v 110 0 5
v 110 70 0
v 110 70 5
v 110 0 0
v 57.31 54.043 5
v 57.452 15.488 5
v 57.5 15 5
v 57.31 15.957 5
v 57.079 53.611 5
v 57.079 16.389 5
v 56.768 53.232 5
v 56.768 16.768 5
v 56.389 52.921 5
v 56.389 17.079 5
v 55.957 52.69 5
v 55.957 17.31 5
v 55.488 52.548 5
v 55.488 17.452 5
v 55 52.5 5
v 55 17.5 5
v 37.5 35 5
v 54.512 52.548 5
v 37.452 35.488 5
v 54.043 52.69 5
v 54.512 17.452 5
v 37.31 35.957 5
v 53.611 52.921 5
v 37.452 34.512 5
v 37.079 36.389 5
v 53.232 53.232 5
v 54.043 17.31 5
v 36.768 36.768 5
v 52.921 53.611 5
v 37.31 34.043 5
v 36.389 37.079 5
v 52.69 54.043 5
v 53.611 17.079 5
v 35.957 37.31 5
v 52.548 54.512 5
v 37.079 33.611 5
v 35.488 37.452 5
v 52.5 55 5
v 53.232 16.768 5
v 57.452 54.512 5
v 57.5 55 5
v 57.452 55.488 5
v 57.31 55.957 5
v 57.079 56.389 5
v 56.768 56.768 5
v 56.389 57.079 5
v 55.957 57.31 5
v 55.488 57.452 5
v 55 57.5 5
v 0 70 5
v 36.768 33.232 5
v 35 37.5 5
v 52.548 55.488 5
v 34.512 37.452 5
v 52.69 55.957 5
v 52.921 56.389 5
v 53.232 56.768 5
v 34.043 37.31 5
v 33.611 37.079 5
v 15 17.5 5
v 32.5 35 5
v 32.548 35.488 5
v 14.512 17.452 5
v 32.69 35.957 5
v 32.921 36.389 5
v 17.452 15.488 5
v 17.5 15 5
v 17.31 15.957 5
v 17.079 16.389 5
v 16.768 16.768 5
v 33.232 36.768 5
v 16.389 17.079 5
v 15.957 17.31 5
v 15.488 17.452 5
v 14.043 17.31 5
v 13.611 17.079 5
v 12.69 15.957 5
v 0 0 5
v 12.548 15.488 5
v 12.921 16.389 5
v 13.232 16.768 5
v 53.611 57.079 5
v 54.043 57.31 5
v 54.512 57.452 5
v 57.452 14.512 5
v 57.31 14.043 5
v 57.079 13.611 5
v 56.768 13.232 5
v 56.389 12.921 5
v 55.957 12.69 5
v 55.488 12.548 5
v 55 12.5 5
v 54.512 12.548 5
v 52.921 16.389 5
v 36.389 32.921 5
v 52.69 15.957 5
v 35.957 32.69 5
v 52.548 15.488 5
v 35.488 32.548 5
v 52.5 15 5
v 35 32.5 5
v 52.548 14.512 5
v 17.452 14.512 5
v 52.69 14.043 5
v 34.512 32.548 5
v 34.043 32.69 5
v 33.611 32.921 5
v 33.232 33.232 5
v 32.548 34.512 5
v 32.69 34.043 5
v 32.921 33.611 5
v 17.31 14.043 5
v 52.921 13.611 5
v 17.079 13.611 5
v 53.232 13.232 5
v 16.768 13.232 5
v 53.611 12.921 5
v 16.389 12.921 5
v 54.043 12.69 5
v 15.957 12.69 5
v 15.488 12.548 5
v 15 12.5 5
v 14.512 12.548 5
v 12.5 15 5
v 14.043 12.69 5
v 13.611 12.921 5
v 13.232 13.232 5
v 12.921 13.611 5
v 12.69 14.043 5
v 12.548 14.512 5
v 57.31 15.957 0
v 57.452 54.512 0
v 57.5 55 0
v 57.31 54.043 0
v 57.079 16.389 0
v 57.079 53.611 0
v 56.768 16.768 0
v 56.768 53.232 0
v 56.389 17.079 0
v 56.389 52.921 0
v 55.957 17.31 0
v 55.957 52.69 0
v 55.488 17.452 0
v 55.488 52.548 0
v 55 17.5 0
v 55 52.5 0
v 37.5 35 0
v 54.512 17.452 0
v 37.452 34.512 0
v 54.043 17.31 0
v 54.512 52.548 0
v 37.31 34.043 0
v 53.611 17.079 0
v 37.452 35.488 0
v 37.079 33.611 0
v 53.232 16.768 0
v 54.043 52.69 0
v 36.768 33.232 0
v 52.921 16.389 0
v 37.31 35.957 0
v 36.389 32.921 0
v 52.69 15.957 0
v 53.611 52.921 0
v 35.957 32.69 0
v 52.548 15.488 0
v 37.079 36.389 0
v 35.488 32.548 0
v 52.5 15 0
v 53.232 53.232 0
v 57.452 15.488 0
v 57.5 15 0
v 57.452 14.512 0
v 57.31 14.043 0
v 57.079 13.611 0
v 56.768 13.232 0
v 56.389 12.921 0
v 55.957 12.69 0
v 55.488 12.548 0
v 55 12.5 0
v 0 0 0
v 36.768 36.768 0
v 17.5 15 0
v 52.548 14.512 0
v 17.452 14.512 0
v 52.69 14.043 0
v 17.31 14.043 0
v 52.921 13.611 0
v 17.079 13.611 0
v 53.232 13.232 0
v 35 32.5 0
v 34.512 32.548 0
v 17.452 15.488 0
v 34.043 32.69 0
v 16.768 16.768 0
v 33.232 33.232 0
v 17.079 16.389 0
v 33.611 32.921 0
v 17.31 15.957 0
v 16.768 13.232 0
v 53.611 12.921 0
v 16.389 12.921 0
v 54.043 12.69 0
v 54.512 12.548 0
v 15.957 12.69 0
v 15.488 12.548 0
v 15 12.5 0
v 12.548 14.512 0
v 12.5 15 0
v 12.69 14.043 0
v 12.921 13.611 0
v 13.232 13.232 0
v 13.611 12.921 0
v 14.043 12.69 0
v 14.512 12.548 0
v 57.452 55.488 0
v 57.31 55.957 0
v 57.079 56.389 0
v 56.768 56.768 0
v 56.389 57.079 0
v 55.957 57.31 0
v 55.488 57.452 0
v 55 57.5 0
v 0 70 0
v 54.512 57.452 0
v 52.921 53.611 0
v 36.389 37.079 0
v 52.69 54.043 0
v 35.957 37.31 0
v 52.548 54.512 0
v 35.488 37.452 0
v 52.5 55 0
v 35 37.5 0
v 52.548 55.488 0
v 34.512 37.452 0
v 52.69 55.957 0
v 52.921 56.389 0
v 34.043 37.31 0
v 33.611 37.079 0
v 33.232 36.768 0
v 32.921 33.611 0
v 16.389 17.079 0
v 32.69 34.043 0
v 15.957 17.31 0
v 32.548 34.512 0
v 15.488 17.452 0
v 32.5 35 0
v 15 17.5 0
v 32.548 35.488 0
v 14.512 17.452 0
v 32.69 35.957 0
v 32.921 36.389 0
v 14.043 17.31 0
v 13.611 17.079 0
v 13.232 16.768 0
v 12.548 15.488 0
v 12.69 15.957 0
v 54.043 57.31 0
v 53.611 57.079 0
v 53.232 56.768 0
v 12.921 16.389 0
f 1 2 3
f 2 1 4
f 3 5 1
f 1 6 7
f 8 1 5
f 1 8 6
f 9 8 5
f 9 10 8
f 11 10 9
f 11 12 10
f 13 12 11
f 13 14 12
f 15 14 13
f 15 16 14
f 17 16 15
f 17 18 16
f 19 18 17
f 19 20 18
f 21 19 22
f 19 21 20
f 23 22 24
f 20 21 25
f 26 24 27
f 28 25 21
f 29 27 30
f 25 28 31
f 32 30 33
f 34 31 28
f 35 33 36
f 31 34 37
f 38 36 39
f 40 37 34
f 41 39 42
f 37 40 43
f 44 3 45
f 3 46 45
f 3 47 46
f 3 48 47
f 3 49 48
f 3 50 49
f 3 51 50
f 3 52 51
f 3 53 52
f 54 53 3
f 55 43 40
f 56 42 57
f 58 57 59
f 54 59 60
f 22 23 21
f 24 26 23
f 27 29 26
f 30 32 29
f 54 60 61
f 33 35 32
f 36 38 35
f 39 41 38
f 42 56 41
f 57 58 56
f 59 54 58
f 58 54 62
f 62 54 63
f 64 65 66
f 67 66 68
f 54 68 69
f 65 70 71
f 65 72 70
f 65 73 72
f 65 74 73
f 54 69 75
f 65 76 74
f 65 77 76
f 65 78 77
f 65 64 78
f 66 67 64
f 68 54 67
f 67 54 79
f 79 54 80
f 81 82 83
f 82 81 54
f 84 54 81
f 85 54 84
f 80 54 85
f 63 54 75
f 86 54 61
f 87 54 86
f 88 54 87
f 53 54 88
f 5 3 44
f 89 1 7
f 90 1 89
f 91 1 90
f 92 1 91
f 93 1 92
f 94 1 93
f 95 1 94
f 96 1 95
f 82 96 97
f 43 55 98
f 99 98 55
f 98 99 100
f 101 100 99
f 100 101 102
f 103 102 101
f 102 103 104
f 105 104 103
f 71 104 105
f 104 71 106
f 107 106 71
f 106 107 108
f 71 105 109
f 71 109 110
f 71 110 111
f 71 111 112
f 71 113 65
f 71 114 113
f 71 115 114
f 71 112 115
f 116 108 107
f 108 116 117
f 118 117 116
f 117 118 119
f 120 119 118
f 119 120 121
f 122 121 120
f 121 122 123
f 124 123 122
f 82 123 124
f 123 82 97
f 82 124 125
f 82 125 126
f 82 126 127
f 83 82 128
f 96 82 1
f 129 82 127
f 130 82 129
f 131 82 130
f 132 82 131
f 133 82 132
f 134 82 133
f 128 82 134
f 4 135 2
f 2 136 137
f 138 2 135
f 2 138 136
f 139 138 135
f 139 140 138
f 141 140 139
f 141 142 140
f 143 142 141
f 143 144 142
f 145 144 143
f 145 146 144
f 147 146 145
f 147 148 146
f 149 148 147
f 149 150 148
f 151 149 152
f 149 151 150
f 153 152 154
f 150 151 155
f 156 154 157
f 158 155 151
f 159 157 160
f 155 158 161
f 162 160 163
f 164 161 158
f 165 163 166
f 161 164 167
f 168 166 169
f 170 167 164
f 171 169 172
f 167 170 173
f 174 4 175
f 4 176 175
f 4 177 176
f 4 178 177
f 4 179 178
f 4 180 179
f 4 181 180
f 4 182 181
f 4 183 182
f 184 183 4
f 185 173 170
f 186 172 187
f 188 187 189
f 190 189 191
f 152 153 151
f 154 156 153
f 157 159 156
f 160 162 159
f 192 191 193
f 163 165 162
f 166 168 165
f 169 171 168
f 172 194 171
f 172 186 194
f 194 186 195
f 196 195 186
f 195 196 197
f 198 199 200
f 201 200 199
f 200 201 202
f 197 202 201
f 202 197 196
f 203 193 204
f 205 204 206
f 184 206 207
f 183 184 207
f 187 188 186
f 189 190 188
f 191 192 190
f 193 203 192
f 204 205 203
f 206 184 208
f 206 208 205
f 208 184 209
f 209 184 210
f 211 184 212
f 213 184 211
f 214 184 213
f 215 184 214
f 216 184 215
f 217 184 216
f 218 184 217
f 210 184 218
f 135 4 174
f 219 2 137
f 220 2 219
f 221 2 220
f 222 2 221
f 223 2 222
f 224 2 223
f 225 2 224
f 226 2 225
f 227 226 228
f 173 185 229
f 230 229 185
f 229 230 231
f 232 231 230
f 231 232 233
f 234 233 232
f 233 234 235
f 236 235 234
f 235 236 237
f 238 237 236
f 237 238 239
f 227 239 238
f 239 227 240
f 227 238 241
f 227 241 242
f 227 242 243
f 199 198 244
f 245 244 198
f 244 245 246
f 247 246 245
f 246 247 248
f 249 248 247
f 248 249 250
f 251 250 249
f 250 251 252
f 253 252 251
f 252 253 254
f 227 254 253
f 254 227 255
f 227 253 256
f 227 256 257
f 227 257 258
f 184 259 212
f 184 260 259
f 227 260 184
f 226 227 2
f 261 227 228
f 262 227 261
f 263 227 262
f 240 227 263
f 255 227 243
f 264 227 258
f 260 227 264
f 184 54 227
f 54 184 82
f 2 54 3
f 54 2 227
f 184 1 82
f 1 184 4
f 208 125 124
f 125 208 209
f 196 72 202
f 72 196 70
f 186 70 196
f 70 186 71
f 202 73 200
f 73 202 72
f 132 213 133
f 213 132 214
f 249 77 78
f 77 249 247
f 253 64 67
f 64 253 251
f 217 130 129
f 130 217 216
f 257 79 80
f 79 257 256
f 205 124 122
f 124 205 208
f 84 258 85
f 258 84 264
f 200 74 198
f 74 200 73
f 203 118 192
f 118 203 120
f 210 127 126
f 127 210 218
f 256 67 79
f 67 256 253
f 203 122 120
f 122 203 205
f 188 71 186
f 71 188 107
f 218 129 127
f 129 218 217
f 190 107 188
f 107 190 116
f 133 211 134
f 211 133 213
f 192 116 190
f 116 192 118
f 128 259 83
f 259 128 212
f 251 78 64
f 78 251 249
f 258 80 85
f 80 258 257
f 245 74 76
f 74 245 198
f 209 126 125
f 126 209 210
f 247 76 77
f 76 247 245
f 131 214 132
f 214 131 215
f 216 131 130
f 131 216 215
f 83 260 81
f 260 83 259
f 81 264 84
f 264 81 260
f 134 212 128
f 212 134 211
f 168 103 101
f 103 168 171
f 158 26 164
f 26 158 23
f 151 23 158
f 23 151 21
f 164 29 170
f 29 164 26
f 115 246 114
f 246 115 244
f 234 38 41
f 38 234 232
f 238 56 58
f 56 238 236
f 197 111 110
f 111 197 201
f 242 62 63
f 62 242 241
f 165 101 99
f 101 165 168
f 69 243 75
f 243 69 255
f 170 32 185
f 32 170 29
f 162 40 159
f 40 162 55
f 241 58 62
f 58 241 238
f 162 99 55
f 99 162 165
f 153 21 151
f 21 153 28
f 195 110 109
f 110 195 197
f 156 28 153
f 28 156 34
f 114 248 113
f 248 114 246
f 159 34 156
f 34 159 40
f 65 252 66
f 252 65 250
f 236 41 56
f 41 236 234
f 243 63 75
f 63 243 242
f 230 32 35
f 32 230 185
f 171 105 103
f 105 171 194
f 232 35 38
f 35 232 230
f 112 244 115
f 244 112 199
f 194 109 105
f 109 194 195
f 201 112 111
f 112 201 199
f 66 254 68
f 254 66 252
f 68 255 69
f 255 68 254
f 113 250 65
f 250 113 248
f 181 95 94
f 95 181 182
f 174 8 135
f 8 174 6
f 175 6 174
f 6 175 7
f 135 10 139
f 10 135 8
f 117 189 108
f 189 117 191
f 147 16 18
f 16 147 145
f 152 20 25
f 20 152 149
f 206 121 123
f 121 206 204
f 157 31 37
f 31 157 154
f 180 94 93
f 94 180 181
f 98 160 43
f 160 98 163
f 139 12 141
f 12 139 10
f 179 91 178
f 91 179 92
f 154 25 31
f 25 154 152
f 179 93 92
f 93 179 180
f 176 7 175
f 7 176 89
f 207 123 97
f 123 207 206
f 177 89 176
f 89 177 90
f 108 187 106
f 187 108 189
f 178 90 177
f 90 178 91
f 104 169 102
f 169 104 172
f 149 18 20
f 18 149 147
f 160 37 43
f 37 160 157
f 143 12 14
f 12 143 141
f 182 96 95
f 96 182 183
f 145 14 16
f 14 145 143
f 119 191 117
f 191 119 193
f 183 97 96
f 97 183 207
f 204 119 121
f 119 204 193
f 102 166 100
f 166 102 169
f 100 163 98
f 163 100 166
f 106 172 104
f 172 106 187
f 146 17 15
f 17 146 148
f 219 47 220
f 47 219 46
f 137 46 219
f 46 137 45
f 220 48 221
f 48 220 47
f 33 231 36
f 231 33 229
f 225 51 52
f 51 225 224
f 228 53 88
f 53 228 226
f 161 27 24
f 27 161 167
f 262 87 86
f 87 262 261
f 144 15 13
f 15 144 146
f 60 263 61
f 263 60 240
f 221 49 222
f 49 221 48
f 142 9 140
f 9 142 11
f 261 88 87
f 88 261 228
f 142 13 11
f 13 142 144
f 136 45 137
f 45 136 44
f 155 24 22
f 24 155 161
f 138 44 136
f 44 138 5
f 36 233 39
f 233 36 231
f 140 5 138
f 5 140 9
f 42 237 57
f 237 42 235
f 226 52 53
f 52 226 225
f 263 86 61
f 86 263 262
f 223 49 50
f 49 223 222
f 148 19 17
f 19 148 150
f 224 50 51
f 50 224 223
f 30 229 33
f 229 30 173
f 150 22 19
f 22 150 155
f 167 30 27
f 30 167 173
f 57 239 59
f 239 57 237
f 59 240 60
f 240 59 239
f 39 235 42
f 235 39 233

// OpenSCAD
$fn = 32;

// ----------------------------------------------------------------------
// Hole field: plate with holes at given coordinates
// ----------------------------------------------------------------------

// --- parameters (mm) ---
plate_l = 110;            // plate length, X
plate_w = 70;             // plate width, Y
plate_t = 5;              // plate thickness, Z
hole_d = 5;               // hole diameter

difference() {
  cube([plate_l, plate_w, plate_t]);
  translate([15, 15, -1]) cylinder(h = plate_t + 2, d = hole_d);
  translate([35, 35, -1]) cylinder(h = plate_t + 2, d = hole_d);
  translate([55, 15, -1]) cylinder(h = plate_t + 2, d = hole_d);
  translate([55, 55, -1]) cylinder(h = plate_t + 2, d = hole_d);
}
